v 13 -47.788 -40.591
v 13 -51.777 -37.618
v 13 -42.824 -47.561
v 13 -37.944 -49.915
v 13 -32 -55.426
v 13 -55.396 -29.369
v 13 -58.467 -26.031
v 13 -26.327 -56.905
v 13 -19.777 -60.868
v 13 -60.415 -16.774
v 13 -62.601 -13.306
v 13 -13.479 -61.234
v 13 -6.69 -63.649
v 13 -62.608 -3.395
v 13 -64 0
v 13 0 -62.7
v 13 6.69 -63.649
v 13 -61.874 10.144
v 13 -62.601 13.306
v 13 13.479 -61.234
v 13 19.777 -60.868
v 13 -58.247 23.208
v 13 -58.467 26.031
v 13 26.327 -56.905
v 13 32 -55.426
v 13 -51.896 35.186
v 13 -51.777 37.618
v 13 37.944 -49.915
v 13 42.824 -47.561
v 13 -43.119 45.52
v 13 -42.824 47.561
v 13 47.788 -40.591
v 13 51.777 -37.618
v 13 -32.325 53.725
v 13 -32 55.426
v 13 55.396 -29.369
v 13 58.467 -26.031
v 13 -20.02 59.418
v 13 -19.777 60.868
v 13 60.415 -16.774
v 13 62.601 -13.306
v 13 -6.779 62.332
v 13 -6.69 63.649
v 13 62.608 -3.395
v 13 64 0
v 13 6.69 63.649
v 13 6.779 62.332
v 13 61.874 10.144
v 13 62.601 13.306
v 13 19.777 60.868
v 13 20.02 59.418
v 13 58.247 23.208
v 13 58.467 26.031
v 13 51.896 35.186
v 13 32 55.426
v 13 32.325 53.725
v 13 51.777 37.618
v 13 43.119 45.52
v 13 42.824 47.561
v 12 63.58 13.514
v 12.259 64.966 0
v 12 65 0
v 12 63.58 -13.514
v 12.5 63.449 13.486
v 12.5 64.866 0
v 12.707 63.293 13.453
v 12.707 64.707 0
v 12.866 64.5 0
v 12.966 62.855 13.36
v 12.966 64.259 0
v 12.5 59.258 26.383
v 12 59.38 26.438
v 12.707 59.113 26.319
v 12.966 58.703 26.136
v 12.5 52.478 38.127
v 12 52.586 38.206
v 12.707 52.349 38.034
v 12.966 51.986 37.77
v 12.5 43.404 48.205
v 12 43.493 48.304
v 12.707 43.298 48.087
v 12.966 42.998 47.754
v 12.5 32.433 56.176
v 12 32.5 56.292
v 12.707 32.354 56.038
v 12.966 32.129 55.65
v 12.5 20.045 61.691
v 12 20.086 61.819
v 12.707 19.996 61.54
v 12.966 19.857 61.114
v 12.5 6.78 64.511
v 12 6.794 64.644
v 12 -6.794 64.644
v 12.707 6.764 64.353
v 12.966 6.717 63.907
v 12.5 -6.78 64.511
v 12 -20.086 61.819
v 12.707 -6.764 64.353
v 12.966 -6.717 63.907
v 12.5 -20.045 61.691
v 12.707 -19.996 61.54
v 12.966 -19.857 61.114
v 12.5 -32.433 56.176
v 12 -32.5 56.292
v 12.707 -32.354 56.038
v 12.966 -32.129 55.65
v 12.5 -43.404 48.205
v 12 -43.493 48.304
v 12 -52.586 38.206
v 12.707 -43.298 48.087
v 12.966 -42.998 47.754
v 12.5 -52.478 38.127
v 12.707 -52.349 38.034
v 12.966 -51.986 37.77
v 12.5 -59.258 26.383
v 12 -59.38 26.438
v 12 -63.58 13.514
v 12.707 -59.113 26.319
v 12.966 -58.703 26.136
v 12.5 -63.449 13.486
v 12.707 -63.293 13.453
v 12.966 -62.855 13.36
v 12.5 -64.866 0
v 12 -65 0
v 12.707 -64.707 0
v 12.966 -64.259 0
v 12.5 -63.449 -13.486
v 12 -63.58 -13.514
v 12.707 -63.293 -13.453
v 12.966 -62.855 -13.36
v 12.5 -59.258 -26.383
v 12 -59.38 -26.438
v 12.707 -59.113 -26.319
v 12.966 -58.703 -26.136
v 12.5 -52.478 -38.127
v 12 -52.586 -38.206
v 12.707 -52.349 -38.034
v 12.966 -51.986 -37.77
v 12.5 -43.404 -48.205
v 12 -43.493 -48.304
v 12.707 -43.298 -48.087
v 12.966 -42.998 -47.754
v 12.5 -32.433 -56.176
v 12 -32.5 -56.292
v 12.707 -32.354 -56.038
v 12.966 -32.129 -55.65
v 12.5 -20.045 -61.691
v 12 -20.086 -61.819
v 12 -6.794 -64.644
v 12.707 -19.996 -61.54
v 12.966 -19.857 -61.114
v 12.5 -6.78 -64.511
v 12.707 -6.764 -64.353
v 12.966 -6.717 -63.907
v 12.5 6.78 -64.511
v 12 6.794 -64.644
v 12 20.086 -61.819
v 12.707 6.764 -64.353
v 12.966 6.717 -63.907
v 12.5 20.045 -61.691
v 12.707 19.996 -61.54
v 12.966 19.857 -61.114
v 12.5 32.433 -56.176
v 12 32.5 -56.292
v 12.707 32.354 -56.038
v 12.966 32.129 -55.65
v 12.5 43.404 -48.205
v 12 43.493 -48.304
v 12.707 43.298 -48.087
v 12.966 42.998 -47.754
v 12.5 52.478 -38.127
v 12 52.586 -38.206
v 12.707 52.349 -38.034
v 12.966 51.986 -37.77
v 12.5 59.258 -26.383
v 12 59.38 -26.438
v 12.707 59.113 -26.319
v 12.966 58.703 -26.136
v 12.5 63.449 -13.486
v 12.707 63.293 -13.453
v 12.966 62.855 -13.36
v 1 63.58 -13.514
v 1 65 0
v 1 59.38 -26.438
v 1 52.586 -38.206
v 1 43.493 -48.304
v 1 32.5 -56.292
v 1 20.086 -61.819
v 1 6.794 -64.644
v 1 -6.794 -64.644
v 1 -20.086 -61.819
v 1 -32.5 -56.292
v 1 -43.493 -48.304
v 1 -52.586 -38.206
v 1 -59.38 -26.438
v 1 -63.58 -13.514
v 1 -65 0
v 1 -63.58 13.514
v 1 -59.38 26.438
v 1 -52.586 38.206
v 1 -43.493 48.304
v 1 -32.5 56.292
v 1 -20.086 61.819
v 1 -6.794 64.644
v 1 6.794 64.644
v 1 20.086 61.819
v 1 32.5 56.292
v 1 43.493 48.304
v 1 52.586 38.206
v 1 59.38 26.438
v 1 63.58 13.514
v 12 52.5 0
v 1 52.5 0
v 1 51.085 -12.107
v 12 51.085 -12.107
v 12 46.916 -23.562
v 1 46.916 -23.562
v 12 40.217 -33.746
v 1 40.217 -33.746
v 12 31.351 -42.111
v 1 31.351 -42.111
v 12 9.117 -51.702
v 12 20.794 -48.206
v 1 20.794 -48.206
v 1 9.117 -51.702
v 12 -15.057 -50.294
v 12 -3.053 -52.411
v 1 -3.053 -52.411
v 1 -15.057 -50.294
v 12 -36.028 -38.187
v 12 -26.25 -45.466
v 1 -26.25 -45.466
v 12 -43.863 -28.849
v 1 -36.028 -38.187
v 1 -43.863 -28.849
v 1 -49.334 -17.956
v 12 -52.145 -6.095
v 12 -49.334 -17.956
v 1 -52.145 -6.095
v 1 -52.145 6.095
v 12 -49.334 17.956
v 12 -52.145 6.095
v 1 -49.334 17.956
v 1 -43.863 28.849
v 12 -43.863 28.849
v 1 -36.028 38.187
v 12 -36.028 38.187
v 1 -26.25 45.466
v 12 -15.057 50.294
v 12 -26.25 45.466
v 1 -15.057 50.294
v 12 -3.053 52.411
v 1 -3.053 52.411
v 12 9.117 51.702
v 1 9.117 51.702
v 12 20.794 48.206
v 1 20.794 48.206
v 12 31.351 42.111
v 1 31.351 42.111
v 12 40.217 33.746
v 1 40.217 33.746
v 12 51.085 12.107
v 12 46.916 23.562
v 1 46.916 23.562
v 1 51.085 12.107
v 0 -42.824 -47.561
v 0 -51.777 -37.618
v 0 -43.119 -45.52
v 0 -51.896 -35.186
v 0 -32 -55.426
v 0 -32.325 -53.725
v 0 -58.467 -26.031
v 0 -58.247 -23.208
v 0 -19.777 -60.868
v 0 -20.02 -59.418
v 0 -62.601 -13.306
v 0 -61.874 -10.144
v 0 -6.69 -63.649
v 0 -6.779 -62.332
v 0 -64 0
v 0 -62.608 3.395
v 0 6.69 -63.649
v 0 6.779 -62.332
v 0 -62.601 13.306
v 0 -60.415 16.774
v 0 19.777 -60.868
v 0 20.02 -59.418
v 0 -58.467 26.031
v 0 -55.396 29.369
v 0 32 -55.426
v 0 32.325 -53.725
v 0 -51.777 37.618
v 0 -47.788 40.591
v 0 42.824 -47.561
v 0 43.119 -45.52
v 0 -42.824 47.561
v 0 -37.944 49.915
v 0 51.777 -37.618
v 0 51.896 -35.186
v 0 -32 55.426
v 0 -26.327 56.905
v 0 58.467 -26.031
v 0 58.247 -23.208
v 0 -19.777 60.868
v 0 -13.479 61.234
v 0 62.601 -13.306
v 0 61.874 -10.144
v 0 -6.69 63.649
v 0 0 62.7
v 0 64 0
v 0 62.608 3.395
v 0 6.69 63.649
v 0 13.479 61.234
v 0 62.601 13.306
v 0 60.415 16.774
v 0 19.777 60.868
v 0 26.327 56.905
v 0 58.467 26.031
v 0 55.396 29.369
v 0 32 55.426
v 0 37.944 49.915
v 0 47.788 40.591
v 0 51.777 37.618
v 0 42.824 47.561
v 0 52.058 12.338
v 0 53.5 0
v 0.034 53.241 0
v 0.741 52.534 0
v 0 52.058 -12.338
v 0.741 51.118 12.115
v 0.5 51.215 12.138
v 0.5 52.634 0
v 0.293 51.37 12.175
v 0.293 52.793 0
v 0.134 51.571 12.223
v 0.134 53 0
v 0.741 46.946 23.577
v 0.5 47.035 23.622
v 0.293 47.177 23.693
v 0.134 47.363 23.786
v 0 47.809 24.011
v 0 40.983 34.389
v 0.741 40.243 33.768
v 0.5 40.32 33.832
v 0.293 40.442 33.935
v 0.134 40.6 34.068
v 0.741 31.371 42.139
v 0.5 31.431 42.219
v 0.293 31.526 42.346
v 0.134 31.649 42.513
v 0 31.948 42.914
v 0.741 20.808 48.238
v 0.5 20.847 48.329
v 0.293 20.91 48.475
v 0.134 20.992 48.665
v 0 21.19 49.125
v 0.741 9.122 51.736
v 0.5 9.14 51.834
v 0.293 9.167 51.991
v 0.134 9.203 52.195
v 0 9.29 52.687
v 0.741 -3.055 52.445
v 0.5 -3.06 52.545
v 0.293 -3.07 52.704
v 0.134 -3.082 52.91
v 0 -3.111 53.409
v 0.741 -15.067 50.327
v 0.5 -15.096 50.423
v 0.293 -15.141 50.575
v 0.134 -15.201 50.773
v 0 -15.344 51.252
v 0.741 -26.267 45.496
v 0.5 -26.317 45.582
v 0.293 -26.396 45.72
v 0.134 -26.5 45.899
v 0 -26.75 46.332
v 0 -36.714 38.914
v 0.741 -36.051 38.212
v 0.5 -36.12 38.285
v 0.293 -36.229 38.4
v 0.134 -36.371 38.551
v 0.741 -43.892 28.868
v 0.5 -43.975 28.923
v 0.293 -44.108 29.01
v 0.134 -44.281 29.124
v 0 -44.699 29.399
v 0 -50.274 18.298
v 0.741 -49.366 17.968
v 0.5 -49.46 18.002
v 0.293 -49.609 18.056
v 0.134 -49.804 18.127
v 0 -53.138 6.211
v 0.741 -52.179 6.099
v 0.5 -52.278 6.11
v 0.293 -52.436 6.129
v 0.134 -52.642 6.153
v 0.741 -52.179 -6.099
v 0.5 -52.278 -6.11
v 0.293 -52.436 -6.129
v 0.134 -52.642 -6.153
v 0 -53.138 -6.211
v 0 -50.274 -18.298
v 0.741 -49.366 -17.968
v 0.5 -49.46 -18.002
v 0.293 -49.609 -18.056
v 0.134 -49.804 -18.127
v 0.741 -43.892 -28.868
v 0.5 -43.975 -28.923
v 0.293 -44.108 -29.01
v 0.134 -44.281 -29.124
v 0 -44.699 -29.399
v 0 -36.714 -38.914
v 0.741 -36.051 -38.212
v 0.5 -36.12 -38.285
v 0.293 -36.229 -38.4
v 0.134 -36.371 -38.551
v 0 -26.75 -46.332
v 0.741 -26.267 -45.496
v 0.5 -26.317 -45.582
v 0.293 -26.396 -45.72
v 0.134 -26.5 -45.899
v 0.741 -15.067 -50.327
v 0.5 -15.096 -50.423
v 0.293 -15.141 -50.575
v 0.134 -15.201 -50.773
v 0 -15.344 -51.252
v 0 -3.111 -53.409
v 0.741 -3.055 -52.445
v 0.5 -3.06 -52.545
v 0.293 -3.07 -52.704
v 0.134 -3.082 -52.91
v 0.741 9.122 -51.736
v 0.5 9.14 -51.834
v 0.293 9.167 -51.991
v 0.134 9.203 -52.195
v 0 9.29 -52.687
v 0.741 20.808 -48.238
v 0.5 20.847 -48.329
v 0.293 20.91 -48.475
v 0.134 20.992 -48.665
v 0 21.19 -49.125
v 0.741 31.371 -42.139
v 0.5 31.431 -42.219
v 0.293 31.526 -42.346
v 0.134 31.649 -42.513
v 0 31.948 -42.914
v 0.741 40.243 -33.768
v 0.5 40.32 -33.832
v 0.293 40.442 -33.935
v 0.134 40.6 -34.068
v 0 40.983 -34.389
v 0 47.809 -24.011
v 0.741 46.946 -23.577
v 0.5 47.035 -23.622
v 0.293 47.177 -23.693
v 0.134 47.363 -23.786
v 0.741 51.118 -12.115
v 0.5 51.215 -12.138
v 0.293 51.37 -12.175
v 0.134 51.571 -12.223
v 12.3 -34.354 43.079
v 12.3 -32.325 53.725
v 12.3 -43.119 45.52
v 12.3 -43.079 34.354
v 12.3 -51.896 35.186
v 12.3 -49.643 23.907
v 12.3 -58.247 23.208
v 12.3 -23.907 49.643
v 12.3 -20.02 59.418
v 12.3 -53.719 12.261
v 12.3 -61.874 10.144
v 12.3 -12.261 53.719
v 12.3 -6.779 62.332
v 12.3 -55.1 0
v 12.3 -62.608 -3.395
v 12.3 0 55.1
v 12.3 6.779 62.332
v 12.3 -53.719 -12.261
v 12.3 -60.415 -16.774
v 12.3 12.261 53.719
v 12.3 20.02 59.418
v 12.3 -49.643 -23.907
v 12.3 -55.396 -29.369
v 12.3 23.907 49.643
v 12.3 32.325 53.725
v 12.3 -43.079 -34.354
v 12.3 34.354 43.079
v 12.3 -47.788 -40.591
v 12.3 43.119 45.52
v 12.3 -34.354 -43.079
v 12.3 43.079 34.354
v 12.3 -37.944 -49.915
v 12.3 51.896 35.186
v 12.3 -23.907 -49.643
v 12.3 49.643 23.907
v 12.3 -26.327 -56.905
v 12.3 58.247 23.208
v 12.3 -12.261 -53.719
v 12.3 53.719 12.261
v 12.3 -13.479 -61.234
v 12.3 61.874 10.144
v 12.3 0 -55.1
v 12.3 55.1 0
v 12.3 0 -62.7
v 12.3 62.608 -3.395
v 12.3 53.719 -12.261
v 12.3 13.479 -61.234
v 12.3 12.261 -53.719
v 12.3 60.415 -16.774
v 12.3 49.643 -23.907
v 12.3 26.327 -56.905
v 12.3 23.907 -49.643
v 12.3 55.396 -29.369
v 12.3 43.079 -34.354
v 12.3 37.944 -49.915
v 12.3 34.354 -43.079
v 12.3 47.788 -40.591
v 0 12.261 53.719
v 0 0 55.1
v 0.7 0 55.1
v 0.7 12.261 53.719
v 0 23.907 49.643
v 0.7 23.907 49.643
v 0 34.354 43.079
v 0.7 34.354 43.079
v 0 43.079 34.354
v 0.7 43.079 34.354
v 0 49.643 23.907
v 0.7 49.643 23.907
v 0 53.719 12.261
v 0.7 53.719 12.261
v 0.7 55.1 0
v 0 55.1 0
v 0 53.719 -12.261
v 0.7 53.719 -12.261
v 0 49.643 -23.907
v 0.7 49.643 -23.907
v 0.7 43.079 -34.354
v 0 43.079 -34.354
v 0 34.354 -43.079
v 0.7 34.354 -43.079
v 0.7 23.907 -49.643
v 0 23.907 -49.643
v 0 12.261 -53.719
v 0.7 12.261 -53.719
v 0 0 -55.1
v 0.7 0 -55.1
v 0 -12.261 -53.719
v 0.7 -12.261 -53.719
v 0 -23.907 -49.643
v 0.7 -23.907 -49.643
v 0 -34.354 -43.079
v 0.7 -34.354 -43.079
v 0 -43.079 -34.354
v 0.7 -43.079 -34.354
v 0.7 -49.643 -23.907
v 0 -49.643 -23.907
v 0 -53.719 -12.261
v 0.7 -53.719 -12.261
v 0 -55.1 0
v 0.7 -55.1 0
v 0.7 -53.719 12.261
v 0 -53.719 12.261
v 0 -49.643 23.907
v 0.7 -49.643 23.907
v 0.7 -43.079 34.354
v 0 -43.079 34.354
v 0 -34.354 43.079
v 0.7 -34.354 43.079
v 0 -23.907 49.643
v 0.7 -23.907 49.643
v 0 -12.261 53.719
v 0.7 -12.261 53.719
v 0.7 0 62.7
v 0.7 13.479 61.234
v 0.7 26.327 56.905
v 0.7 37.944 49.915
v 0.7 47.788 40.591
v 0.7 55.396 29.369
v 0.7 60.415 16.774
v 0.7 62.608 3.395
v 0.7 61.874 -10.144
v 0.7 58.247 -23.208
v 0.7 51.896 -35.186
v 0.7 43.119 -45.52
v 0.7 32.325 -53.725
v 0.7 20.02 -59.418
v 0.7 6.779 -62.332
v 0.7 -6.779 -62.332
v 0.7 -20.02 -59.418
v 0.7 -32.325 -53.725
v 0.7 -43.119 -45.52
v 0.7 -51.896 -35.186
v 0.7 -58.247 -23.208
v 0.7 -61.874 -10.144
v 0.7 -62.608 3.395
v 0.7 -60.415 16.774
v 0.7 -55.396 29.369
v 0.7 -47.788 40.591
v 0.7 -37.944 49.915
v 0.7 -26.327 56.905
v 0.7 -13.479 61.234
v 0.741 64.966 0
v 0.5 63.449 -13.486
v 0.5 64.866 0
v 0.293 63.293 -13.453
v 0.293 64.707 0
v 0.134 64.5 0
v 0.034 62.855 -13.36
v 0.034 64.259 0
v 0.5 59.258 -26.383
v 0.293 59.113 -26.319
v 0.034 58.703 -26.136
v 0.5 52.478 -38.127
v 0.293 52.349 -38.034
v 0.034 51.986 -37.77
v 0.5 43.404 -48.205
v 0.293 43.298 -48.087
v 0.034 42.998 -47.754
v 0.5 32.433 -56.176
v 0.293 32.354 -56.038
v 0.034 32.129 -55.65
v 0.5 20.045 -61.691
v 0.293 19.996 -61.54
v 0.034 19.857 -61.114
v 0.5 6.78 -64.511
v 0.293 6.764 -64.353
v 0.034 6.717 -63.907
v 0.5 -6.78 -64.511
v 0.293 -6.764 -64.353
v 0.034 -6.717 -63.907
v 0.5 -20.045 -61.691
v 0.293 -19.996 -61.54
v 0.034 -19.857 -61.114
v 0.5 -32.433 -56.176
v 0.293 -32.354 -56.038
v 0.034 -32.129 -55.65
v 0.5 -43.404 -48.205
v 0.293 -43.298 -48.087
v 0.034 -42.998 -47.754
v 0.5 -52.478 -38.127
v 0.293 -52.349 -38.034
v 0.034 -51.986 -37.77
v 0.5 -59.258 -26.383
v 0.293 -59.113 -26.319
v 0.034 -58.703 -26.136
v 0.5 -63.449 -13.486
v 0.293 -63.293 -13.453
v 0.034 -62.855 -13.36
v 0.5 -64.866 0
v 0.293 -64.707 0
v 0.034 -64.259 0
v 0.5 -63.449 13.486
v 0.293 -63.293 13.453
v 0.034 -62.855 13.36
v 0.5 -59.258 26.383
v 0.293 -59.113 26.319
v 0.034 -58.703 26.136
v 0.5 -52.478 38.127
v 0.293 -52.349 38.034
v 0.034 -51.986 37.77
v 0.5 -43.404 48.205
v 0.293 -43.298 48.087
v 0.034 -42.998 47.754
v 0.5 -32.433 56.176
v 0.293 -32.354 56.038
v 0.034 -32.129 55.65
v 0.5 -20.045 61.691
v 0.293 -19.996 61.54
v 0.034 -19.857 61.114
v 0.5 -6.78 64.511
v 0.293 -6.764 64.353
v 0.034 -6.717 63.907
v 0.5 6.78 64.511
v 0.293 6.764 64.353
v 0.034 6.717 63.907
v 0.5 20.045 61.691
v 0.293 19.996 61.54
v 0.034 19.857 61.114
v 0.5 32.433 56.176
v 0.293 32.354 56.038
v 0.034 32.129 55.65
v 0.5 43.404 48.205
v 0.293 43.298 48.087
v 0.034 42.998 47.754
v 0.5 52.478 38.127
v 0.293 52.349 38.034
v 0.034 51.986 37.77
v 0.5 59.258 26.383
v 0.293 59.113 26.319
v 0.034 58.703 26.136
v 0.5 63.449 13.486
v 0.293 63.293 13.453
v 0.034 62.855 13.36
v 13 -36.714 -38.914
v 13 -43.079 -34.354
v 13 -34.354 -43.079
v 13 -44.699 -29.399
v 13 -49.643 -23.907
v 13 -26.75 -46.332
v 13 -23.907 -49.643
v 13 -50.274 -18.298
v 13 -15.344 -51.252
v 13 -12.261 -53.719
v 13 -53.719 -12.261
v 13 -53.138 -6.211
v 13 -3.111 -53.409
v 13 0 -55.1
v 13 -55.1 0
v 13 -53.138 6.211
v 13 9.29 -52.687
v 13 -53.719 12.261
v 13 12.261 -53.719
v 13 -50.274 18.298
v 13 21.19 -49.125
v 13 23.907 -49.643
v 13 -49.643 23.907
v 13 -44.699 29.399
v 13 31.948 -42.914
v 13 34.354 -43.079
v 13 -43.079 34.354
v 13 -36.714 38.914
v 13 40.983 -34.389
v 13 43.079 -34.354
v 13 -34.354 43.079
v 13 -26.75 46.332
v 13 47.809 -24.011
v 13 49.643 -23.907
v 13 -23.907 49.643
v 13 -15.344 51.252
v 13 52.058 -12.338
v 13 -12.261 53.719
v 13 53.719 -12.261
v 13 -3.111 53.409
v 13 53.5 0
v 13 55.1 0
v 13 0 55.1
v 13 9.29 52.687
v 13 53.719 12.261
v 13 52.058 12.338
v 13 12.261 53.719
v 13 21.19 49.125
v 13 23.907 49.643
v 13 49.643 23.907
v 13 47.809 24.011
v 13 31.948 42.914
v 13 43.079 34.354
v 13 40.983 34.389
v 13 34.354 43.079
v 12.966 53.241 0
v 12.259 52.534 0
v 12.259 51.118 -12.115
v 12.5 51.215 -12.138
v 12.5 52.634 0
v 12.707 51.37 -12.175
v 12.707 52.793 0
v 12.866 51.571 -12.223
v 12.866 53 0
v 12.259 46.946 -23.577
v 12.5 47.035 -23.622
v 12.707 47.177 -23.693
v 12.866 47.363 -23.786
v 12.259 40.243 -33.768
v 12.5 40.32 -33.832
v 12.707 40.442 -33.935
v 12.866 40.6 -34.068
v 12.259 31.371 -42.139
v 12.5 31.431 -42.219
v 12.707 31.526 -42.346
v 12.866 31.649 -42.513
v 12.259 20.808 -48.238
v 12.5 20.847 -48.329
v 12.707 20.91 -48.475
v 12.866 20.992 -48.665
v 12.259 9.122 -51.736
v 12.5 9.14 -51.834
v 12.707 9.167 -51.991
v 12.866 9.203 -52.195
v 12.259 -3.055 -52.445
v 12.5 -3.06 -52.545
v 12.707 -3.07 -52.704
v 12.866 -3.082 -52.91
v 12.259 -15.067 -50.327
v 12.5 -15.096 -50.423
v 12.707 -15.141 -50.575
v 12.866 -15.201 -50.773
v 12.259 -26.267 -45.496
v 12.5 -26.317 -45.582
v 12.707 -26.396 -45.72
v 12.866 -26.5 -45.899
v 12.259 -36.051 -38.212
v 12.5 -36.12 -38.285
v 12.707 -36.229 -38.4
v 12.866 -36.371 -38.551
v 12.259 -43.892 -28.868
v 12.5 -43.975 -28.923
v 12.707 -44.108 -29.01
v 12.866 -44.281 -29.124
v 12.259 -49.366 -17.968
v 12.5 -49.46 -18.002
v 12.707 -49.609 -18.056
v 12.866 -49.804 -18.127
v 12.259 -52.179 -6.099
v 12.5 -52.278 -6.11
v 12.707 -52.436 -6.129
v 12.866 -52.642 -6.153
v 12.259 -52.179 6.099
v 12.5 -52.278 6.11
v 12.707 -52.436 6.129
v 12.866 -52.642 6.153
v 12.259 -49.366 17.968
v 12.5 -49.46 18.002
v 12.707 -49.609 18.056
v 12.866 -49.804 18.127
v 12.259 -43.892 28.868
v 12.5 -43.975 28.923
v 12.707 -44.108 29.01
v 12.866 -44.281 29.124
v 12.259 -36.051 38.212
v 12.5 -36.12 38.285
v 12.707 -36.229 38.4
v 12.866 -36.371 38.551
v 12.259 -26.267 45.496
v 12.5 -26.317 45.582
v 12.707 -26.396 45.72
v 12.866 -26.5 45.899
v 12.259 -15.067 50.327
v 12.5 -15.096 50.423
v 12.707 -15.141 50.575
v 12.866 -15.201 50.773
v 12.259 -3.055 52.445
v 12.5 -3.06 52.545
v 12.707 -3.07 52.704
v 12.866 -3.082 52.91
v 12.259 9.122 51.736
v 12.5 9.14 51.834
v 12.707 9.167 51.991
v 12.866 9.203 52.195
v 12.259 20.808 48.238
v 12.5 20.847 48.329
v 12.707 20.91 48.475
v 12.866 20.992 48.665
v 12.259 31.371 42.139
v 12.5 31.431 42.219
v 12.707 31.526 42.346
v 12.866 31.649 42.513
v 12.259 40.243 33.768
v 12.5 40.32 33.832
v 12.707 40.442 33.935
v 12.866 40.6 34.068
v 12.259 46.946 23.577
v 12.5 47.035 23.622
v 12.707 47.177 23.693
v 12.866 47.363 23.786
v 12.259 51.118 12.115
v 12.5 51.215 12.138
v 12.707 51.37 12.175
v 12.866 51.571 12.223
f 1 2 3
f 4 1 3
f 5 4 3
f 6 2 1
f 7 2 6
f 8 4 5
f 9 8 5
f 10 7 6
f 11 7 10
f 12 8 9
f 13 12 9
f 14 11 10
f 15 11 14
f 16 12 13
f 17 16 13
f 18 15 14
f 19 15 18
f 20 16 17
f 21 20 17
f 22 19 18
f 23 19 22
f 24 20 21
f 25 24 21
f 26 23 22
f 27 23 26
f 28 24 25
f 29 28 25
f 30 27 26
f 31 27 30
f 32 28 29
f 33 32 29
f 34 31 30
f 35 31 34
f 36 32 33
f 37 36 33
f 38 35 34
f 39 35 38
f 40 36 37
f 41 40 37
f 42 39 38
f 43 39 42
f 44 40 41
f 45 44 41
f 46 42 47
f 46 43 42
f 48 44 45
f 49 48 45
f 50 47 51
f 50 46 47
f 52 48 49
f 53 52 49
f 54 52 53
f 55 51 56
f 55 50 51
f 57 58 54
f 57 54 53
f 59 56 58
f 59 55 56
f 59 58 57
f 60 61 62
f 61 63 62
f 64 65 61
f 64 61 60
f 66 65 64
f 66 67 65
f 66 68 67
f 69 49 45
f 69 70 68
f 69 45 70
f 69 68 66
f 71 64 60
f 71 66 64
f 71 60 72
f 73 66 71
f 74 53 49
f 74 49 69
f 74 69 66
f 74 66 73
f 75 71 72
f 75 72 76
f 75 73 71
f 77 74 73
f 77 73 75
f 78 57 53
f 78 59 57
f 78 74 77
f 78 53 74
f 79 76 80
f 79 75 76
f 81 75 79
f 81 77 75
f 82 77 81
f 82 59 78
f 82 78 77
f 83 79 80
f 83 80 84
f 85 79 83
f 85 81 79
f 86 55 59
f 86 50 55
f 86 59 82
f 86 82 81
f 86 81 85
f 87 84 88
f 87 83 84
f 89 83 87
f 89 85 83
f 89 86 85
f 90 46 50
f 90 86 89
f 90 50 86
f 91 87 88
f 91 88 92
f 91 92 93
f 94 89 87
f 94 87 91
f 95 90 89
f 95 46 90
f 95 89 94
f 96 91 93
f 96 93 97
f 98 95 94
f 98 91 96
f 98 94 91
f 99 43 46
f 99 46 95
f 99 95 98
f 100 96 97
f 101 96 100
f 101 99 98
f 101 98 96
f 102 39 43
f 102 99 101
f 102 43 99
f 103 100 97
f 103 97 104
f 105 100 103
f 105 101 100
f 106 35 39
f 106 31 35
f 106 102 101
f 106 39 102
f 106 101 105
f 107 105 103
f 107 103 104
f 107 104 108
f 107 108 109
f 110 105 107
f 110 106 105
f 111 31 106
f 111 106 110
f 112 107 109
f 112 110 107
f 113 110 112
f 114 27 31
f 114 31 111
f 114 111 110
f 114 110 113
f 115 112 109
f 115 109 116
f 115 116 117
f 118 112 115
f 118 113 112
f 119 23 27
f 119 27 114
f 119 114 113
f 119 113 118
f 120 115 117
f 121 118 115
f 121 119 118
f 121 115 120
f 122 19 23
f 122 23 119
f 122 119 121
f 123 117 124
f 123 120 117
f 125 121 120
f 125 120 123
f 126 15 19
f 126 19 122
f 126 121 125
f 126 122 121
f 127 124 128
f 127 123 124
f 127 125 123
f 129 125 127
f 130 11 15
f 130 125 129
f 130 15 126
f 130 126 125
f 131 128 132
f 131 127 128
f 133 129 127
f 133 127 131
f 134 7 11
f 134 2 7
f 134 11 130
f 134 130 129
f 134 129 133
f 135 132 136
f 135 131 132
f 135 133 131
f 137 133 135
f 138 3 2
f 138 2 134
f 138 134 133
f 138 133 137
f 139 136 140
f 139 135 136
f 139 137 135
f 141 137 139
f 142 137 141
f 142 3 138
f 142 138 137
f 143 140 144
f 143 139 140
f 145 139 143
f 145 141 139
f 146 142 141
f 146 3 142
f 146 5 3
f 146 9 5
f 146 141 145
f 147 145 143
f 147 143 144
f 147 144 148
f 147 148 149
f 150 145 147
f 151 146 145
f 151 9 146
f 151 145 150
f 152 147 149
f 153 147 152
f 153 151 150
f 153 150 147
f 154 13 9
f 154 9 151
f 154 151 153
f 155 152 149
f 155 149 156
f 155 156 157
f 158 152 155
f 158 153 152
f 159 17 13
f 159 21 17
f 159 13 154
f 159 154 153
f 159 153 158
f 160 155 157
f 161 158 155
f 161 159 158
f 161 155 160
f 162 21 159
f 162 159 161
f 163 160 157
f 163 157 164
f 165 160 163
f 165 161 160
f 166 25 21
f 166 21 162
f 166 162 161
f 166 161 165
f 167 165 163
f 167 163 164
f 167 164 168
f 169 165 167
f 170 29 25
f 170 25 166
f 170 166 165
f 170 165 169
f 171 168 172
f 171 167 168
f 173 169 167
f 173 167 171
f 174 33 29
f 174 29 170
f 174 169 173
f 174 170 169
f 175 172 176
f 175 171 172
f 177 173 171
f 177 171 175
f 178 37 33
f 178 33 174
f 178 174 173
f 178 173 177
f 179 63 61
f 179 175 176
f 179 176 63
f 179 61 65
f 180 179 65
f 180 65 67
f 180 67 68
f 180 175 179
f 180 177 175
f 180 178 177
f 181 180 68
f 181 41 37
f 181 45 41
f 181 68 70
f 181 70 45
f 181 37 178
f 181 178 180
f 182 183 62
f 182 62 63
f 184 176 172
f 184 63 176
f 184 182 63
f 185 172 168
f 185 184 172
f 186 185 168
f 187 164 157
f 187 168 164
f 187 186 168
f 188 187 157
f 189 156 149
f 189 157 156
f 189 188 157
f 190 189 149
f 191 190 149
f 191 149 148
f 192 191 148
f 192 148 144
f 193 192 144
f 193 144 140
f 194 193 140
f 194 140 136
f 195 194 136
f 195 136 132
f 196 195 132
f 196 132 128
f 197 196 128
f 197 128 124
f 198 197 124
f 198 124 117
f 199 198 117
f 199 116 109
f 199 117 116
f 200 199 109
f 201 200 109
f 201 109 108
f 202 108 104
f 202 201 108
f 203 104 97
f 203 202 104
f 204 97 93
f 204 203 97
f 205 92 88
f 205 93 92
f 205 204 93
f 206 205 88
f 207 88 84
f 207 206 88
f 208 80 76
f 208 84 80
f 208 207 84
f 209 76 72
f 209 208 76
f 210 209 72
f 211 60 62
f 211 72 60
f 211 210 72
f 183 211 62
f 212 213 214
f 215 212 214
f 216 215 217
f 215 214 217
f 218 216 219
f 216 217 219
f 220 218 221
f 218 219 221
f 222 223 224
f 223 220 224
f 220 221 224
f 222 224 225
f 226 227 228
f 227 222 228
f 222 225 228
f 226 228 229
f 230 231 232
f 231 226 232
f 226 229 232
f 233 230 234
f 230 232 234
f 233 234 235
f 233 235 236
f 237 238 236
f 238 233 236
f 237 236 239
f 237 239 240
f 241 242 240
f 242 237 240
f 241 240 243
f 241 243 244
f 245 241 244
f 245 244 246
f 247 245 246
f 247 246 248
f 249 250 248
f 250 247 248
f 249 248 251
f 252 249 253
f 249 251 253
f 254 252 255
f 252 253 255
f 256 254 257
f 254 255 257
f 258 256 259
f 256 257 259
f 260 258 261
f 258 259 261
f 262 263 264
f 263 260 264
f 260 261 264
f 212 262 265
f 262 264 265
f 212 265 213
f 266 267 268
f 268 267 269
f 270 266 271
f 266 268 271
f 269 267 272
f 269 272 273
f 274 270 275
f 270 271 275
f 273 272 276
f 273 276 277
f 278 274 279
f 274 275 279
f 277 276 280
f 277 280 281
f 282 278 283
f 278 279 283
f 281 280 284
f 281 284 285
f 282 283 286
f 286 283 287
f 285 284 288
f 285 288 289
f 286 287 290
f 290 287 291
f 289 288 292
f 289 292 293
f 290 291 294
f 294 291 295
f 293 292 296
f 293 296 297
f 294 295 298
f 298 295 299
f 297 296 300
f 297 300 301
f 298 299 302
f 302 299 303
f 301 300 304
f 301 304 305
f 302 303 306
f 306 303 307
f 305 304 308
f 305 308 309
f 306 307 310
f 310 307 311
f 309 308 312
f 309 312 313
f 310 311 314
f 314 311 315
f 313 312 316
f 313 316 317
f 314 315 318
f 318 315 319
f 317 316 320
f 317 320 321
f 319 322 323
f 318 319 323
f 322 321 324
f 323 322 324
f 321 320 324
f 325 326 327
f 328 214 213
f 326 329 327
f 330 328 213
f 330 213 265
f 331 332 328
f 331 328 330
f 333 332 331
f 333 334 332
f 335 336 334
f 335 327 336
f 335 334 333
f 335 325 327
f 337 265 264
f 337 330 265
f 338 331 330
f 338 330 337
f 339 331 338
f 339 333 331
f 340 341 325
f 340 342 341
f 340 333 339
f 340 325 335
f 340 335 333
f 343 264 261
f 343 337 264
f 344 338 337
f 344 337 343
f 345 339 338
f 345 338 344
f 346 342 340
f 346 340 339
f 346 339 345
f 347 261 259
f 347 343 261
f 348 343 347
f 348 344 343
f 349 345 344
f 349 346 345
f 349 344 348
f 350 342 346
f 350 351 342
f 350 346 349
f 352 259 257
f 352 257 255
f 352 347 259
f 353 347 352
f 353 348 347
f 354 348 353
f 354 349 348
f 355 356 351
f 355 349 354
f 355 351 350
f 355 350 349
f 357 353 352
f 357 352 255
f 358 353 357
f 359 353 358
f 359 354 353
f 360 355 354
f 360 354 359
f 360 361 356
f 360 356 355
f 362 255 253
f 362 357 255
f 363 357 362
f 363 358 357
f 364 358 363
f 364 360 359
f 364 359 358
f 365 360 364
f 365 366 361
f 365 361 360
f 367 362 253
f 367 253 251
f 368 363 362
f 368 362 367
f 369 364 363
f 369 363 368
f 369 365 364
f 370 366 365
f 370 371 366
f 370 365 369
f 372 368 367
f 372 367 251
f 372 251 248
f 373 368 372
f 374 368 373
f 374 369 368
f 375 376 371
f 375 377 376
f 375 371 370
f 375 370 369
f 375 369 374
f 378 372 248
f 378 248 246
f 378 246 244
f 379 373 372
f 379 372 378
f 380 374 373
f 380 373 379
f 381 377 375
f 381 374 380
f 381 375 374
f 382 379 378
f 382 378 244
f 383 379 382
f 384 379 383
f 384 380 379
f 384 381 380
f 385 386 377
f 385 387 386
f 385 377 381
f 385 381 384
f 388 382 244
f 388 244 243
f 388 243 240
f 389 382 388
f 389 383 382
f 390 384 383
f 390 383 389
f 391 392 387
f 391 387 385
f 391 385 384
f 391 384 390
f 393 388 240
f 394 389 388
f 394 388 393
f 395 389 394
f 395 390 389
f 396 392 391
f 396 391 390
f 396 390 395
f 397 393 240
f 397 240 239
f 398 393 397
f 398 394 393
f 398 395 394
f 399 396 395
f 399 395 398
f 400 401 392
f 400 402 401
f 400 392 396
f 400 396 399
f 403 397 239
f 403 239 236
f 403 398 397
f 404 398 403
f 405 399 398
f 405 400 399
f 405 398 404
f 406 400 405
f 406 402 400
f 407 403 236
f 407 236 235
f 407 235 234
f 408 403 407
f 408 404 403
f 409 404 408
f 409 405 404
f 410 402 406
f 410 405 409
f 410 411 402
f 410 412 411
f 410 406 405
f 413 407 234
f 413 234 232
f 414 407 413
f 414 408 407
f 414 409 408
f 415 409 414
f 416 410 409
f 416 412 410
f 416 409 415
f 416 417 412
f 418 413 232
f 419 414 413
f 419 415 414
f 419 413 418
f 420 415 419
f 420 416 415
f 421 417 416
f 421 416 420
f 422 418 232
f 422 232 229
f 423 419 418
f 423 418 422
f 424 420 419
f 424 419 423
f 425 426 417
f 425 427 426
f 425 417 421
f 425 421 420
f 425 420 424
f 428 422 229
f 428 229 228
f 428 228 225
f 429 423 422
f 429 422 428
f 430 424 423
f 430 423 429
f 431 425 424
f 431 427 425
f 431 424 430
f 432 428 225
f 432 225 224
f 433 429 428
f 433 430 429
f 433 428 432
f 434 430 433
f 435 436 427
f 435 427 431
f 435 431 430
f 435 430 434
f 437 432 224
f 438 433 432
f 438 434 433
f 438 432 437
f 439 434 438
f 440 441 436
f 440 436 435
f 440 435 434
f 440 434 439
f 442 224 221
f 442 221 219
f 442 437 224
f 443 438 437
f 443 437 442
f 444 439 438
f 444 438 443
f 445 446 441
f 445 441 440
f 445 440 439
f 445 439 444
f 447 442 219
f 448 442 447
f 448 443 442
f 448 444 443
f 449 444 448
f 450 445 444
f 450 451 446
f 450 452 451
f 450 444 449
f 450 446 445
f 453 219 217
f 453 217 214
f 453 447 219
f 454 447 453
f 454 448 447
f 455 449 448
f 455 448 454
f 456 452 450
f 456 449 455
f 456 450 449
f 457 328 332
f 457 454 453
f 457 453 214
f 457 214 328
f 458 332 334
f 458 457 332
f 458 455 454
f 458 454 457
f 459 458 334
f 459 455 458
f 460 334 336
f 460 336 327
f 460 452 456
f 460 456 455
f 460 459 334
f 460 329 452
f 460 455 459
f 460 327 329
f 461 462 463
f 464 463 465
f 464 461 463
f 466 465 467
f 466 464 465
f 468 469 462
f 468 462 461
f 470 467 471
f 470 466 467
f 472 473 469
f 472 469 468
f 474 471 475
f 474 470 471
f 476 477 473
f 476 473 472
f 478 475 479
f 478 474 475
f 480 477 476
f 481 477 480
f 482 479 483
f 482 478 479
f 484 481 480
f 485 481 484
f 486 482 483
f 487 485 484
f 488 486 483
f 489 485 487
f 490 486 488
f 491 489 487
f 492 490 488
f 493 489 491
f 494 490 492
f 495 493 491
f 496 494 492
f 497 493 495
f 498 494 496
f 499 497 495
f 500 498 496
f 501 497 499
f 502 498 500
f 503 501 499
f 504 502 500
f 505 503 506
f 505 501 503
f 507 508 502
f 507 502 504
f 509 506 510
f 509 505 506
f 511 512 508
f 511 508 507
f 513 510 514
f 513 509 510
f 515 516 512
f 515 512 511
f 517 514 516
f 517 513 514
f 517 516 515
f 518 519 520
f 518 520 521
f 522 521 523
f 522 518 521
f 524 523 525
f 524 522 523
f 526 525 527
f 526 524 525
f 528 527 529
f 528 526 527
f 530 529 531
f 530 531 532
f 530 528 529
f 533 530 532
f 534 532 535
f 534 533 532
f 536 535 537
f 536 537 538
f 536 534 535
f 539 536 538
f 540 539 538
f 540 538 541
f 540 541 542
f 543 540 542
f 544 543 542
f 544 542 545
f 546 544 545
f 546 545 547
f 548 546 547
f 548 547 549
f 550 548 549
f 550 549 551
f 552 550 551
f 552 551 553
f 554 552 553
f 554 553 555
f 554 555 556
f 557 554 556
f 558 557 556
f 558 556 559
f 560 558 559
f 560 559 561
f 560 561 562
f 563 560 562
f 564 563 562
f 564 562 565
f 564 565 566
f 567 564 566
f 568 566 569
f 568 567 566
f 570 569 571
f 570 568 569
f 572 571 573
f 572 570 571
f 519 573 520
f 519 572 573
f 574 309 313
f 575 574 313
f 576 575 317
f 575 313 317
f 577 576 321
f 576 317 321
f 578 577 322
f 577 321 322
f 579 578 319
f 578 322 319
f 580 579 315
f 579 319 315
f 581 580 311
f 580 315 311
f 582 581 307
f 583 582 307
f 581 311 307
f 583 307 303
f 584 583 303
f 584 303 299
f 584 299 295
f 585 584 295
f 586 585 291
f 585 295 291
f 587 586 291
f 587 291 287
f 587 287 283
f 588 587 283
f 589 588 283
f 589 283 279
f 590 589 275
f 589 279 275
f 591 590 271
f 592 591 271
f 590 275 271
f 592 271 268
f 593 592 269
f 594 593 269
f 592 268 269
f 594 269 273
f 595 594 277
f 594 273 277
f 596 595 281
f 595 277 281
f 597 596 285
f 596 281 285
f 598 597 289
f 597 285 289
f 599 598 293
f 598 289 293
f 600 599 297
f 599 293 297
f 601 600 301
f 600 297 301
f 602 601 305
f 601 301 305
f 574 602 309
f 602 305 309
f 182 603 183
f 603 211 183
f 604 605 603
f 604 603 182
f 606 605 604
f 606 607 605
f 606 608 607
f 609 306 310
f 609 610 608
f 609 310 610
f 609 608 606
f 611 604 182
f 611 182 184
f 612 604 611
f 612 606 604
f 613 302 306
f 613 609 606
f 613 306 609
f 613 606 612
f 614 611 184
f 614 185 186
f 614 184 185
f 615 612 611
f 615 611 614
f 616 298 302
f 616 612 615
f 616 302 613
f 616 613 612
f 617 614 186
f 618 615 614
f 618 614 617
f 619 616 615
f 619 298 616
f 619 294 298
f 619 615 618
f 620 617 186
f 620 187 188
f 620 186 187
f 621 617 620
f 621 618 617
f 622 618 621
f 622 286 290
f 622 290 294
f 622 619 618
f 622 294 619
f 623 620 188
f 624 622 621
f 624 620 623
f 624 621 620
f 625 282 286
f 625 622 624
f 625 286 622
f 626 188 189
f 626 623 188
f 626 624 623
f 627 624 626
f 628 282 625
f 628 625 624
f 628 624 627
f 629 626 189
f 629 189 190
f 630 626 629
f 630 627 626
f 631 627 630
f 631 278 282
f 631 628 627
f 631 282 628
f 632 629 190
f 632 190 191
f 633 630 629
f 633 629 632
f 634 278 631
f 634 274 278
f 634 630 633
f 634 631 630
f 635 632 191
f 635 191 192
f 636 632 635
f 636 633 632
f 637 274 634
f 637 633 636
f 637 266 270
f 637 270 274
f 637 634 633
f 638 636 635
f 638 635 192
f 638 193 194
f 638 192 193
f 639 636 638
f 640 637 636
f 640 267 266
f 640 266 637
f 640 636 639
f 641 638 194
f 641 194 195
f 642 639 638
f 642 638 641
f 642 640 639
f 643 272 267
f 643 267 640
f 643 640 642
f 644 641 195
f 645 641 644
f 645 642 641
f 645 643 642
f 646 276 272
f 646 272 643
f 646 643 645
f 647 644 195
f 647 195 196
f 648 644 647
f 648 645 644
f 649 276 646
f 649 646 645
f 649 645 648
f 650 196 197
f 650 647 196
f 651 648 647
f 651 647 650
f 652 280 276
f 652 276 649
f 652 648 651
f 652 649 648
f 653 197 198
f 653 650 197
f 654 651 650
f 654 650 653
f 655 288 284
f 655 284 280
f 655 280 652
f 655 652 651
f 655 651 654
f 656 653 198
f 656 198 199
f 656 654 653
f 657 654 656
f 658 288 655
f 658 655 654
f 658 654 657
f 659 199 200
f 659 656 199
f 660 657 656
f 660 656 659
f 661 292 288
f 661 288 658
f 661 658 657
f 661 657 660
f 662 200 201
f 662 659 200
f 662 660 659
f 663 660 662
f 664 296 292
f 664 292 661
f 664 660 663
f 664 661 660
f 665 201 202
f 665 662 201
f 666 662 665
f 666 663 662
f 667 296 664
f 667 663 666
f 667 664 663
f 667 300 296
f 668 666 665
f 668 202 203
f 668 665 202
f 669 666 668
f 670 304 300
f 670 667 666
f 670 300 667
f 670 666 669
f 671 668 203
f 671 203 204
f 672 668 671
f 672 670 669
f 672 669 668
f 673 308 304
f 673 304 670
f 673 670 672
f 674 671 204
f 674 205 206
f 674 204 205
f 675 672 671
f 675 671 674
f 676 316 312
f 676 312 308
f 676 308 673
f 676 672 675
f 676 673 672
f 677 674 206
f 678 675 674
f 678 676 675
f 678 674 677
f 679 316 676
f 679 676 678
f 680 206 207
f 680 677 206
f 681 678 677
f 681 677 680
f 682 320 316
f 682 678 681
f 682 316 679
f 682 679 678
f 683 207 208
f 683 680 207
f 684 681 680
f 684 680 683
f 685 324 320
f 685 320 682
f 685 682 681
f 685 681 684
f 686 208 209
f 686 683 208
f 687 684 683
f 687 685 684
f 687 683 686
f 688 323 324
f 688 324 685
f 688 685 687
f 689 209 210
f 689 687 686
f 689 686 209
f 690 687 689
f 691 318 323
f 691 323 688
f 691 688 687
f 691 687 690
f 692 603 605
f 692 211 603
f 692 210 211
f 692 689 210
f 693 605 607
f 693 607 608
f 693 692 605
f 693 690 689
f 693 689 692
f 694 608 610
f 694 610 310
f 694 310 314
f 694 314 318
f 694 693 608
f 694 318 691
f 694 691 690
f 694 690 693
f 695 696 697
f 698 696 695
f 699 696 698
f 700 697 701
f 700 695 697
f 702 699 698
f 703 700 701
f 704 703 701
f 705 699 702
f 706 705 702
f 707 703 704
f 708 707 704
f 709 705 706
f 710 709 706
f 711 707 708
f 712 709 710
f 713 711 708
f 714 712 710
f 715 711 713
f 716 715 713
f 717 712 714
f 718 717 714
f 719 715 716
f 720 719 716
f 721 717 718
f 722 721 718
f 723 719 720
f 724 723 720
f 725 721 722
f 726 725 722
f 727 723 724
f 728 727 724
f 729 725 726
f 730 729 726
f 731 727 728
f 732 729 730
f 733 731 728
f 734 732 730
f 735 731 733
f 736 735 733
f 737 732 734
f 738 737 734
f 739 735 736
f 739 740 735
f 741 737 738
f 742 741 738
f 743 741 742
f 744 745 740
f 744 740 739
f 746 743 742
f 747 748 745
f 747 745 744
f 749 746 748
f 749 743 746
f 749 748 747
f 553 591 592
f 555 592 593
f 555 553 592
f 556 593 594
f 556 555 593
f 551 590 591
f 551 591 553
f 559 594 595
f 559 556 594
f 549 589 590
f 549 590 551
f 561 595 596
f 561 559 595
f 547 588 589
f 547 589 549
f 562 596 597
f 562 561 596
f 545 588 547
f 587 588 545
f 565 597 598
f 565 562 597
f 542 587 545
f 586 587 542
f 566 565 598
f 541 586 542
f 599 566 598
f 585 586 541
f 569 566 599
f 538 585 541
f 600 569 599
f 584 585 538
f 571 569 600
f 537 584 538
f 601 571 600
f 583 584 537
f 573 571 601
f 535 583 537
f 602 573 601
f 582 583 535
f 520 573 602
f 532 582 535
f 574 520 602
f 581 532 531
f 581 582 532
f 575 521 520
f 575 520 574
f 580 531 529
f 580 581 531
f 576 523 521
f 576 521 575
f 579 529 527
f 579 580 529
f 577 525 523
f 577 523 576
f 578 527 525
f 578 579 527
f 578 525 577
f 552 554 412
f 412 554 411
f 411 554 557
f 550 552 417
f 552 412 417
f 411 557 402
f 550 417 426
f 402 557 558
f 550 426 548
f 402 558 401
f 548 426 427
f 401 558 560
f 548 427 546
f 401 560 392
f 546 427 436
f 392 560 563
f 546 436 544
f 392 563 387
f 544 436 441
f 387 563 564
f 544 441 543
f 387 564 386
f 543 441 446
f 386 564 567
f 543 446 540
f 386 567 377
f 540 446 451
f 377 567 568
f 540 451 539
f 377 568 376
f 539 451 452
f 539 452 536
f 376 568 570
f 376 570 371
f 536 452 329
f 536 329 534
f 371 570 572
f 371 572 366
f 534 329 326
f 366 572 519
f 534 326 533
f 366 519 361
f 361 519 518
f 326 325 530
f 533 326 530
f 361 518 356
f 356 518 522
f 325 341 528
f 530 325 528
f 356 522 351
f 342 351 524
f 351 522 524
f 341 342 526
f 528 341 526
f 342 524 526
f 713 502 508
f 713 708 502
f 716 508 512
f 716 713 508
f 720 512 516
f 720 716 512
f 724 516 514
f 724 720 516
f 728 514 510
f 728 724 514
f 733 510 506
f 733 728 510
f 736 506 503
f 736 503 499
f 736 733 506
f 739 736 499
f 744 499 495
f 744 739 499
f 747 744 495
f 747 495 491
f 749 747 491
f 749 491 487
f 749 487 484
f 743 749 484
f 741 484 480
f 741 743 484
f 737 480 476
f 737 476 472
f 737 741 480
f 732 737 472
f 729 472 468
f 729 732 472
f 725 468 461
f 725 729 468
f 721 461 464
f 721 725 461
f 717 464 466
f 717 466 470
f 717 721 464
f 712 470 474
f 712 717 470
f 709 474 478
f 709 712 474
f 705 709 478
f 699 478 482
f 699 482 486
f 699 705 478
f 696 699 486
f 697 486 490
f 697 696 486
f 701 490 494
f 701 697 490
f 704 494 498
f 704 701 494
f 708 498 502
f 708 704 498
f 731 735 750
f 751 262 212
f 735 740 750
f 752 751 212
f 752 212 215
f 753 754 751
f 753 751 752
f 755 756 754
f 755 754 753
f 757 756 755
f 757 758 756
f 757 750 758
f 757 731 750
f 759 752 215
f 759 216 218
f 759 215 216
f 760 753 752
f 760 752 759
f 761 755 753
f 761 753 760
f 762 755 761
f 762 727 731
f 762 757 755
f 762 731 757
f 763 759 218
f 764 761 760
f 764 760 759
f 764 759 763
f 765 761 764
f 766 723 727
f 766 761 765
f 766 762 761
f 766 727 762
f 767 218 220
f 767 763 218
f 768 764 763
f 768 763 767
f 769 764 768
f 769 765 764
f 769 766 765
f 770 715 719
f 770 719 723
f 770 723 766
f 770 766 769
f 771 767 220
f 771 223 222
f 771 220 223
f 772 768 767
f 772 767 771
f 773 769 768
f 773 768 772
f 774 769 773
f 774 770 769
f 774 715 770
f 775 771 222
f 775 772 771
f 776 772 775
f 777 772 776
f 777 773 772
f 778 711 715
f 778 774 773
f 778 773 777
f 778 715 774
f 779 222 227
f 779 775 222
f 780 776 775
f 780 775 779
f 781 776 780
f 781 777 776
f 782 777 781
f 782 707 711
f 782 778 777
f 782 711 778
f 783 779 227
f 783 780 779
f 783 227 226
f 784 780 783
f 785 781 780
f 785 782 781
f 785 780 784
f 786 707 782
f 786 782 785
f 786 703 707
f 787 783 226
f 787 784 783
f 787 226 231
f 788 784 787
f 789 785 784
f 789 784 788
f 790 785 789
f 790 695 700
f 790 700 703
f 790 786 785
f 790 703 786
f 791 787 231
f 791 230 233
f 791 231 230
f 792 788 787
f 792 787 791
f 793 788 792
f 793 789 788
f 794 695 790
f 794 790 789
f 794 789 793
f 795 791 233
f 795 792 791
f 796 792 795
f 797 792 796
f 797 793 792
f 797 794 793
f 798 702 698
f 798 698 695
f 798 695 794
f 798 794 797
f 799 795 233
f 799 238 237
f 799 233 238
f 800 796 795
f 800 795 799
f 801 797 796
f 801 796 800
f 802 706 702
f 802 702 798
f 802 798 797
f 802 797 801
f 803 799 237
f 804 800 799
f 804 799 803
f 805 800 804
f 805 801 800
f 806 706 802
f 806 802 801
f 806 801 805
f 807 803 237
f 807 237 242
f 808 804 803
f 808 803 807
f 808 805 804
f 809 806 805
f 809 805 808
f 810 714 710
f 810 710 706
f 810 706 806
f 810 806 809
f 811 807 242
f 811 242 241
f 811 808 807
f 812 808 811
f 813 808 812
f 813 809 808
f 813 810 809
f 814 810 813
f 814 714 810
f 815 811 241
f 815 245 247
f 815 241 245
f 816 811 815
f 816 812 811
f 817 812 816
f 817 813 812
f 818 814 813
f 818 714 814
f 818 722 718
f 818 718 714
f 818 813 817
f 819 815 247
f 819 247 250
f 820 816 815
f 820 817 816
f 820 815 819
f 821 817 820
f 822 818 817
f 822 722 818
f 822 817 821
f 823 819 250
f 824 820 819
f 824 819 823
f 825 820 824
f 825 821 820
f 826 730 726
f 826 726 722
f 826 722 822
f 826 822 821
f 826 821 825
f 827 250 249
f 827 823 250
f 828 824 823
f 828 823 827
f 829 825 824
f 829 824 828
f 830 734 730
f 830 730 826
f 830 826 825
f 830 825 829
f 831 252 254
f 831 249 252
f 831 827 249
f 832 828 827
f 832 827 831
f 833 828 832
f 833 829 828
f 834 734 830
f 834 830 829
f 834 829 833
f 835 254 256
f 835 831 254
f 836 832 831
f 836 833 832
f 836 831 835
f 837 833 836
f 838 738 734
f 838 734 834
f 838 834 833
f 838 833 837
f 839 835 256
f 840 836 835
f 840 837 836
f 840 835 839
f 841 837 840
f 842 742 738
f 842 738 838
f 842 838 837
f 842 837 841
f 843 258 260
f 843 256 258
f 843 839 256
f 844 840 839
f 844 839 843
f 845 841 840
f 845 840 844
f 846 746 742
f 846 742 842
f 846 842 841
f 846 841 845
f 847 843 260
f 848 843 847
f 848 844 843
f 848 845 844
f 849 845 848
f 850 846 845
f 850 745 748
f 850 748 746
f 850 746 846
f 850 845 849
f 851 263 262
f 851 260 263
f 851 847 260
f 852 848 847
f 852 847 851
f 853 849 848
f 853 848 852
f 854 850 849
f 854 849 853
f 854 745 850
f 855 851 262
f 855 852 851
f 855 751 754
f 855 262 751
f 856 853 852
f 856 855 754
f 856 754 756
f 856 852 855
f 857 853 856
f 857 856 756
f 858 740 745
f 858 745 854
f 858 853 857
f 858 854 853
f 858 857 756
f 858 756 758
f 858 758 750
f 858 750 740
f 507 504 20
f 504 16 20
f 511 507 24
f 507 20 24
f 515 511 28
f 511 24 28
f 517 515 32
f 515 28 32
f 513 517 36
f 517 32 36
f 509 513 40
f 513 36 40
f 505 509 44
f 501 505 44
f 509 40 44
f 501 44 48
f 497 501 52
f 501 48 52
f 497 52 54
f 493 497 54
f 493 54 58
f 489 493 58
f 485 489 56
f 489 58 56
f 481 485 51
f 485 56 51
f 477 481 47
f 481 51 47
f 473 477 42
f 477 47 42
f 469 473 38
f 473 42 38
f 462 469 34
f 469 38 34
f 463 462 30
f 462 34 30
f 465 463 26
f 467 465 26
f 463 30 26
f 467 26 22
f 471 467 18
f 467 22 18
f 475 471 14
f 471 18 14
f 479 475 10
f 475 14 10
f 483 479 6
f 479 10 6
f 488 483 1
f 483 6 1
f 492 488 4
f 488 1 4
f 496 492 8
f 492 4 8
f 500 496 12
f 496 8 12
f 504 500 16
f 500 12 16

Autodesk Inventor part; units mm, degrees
ref_plane "YZ Plane" through (0, 0, 0) normal (1, 0, 0) x (0, 1, 0)
ref_plane "XZ Plane" through (0, 0, 0) normal (0, 1, 0) x (-1, 0, 0)
ref_plane "XY Plane" through (0, 0, 0) normal (0, 0, 1) x (1, 0, 0)
sketch "スケッチ1" plane through (0, 0, 0) normal (1, 0, 0) x (0, 1, 0)
  circle A0 centre (0, 0) radius 65
  circle A1 centre (0, 0) radius 52.5
  dimension "d0" = 130
  dimension "d1" = 105
extrude "押し出し1" add sketch "スケッチ1" along normal blind 13
fillet "フィレット1" radius 1 4 edges at (13, -65, 0) (0, -65, 0) (13, -52.5, 0) (0, -52.5, 0)
sketch "スケッチ2" plane through (13, 0, 0) normal (1, 0, 0) x (0, 0, -1)
  circle A0 centre (0, 0) radius 55.1
  circle A1 centre (0, 0) radius 52.5 projected
  circle A2 centre (0, 0) radius 62.7
  circle A3 centre (0, 0) radius 65 projected
  dimension "d5" = 2.6
  dimension "d6" = 2.3
extrude "押し出し2" cut sketch "スケッチ2" against normal blind 0.7 contours A2
sketch "スケッチ3" plane through (0, 0, 0) normal (-1, 0, 0) x (0, 0, 1)
  circle A0 centre (0, 0) radius 55.1
  circle A1 centre (0, 0) radius 62.7
extrude "押し出し3" cut sketch "スケッチ3" against normal blind 0.7
properties part number "Bearing_Large"
